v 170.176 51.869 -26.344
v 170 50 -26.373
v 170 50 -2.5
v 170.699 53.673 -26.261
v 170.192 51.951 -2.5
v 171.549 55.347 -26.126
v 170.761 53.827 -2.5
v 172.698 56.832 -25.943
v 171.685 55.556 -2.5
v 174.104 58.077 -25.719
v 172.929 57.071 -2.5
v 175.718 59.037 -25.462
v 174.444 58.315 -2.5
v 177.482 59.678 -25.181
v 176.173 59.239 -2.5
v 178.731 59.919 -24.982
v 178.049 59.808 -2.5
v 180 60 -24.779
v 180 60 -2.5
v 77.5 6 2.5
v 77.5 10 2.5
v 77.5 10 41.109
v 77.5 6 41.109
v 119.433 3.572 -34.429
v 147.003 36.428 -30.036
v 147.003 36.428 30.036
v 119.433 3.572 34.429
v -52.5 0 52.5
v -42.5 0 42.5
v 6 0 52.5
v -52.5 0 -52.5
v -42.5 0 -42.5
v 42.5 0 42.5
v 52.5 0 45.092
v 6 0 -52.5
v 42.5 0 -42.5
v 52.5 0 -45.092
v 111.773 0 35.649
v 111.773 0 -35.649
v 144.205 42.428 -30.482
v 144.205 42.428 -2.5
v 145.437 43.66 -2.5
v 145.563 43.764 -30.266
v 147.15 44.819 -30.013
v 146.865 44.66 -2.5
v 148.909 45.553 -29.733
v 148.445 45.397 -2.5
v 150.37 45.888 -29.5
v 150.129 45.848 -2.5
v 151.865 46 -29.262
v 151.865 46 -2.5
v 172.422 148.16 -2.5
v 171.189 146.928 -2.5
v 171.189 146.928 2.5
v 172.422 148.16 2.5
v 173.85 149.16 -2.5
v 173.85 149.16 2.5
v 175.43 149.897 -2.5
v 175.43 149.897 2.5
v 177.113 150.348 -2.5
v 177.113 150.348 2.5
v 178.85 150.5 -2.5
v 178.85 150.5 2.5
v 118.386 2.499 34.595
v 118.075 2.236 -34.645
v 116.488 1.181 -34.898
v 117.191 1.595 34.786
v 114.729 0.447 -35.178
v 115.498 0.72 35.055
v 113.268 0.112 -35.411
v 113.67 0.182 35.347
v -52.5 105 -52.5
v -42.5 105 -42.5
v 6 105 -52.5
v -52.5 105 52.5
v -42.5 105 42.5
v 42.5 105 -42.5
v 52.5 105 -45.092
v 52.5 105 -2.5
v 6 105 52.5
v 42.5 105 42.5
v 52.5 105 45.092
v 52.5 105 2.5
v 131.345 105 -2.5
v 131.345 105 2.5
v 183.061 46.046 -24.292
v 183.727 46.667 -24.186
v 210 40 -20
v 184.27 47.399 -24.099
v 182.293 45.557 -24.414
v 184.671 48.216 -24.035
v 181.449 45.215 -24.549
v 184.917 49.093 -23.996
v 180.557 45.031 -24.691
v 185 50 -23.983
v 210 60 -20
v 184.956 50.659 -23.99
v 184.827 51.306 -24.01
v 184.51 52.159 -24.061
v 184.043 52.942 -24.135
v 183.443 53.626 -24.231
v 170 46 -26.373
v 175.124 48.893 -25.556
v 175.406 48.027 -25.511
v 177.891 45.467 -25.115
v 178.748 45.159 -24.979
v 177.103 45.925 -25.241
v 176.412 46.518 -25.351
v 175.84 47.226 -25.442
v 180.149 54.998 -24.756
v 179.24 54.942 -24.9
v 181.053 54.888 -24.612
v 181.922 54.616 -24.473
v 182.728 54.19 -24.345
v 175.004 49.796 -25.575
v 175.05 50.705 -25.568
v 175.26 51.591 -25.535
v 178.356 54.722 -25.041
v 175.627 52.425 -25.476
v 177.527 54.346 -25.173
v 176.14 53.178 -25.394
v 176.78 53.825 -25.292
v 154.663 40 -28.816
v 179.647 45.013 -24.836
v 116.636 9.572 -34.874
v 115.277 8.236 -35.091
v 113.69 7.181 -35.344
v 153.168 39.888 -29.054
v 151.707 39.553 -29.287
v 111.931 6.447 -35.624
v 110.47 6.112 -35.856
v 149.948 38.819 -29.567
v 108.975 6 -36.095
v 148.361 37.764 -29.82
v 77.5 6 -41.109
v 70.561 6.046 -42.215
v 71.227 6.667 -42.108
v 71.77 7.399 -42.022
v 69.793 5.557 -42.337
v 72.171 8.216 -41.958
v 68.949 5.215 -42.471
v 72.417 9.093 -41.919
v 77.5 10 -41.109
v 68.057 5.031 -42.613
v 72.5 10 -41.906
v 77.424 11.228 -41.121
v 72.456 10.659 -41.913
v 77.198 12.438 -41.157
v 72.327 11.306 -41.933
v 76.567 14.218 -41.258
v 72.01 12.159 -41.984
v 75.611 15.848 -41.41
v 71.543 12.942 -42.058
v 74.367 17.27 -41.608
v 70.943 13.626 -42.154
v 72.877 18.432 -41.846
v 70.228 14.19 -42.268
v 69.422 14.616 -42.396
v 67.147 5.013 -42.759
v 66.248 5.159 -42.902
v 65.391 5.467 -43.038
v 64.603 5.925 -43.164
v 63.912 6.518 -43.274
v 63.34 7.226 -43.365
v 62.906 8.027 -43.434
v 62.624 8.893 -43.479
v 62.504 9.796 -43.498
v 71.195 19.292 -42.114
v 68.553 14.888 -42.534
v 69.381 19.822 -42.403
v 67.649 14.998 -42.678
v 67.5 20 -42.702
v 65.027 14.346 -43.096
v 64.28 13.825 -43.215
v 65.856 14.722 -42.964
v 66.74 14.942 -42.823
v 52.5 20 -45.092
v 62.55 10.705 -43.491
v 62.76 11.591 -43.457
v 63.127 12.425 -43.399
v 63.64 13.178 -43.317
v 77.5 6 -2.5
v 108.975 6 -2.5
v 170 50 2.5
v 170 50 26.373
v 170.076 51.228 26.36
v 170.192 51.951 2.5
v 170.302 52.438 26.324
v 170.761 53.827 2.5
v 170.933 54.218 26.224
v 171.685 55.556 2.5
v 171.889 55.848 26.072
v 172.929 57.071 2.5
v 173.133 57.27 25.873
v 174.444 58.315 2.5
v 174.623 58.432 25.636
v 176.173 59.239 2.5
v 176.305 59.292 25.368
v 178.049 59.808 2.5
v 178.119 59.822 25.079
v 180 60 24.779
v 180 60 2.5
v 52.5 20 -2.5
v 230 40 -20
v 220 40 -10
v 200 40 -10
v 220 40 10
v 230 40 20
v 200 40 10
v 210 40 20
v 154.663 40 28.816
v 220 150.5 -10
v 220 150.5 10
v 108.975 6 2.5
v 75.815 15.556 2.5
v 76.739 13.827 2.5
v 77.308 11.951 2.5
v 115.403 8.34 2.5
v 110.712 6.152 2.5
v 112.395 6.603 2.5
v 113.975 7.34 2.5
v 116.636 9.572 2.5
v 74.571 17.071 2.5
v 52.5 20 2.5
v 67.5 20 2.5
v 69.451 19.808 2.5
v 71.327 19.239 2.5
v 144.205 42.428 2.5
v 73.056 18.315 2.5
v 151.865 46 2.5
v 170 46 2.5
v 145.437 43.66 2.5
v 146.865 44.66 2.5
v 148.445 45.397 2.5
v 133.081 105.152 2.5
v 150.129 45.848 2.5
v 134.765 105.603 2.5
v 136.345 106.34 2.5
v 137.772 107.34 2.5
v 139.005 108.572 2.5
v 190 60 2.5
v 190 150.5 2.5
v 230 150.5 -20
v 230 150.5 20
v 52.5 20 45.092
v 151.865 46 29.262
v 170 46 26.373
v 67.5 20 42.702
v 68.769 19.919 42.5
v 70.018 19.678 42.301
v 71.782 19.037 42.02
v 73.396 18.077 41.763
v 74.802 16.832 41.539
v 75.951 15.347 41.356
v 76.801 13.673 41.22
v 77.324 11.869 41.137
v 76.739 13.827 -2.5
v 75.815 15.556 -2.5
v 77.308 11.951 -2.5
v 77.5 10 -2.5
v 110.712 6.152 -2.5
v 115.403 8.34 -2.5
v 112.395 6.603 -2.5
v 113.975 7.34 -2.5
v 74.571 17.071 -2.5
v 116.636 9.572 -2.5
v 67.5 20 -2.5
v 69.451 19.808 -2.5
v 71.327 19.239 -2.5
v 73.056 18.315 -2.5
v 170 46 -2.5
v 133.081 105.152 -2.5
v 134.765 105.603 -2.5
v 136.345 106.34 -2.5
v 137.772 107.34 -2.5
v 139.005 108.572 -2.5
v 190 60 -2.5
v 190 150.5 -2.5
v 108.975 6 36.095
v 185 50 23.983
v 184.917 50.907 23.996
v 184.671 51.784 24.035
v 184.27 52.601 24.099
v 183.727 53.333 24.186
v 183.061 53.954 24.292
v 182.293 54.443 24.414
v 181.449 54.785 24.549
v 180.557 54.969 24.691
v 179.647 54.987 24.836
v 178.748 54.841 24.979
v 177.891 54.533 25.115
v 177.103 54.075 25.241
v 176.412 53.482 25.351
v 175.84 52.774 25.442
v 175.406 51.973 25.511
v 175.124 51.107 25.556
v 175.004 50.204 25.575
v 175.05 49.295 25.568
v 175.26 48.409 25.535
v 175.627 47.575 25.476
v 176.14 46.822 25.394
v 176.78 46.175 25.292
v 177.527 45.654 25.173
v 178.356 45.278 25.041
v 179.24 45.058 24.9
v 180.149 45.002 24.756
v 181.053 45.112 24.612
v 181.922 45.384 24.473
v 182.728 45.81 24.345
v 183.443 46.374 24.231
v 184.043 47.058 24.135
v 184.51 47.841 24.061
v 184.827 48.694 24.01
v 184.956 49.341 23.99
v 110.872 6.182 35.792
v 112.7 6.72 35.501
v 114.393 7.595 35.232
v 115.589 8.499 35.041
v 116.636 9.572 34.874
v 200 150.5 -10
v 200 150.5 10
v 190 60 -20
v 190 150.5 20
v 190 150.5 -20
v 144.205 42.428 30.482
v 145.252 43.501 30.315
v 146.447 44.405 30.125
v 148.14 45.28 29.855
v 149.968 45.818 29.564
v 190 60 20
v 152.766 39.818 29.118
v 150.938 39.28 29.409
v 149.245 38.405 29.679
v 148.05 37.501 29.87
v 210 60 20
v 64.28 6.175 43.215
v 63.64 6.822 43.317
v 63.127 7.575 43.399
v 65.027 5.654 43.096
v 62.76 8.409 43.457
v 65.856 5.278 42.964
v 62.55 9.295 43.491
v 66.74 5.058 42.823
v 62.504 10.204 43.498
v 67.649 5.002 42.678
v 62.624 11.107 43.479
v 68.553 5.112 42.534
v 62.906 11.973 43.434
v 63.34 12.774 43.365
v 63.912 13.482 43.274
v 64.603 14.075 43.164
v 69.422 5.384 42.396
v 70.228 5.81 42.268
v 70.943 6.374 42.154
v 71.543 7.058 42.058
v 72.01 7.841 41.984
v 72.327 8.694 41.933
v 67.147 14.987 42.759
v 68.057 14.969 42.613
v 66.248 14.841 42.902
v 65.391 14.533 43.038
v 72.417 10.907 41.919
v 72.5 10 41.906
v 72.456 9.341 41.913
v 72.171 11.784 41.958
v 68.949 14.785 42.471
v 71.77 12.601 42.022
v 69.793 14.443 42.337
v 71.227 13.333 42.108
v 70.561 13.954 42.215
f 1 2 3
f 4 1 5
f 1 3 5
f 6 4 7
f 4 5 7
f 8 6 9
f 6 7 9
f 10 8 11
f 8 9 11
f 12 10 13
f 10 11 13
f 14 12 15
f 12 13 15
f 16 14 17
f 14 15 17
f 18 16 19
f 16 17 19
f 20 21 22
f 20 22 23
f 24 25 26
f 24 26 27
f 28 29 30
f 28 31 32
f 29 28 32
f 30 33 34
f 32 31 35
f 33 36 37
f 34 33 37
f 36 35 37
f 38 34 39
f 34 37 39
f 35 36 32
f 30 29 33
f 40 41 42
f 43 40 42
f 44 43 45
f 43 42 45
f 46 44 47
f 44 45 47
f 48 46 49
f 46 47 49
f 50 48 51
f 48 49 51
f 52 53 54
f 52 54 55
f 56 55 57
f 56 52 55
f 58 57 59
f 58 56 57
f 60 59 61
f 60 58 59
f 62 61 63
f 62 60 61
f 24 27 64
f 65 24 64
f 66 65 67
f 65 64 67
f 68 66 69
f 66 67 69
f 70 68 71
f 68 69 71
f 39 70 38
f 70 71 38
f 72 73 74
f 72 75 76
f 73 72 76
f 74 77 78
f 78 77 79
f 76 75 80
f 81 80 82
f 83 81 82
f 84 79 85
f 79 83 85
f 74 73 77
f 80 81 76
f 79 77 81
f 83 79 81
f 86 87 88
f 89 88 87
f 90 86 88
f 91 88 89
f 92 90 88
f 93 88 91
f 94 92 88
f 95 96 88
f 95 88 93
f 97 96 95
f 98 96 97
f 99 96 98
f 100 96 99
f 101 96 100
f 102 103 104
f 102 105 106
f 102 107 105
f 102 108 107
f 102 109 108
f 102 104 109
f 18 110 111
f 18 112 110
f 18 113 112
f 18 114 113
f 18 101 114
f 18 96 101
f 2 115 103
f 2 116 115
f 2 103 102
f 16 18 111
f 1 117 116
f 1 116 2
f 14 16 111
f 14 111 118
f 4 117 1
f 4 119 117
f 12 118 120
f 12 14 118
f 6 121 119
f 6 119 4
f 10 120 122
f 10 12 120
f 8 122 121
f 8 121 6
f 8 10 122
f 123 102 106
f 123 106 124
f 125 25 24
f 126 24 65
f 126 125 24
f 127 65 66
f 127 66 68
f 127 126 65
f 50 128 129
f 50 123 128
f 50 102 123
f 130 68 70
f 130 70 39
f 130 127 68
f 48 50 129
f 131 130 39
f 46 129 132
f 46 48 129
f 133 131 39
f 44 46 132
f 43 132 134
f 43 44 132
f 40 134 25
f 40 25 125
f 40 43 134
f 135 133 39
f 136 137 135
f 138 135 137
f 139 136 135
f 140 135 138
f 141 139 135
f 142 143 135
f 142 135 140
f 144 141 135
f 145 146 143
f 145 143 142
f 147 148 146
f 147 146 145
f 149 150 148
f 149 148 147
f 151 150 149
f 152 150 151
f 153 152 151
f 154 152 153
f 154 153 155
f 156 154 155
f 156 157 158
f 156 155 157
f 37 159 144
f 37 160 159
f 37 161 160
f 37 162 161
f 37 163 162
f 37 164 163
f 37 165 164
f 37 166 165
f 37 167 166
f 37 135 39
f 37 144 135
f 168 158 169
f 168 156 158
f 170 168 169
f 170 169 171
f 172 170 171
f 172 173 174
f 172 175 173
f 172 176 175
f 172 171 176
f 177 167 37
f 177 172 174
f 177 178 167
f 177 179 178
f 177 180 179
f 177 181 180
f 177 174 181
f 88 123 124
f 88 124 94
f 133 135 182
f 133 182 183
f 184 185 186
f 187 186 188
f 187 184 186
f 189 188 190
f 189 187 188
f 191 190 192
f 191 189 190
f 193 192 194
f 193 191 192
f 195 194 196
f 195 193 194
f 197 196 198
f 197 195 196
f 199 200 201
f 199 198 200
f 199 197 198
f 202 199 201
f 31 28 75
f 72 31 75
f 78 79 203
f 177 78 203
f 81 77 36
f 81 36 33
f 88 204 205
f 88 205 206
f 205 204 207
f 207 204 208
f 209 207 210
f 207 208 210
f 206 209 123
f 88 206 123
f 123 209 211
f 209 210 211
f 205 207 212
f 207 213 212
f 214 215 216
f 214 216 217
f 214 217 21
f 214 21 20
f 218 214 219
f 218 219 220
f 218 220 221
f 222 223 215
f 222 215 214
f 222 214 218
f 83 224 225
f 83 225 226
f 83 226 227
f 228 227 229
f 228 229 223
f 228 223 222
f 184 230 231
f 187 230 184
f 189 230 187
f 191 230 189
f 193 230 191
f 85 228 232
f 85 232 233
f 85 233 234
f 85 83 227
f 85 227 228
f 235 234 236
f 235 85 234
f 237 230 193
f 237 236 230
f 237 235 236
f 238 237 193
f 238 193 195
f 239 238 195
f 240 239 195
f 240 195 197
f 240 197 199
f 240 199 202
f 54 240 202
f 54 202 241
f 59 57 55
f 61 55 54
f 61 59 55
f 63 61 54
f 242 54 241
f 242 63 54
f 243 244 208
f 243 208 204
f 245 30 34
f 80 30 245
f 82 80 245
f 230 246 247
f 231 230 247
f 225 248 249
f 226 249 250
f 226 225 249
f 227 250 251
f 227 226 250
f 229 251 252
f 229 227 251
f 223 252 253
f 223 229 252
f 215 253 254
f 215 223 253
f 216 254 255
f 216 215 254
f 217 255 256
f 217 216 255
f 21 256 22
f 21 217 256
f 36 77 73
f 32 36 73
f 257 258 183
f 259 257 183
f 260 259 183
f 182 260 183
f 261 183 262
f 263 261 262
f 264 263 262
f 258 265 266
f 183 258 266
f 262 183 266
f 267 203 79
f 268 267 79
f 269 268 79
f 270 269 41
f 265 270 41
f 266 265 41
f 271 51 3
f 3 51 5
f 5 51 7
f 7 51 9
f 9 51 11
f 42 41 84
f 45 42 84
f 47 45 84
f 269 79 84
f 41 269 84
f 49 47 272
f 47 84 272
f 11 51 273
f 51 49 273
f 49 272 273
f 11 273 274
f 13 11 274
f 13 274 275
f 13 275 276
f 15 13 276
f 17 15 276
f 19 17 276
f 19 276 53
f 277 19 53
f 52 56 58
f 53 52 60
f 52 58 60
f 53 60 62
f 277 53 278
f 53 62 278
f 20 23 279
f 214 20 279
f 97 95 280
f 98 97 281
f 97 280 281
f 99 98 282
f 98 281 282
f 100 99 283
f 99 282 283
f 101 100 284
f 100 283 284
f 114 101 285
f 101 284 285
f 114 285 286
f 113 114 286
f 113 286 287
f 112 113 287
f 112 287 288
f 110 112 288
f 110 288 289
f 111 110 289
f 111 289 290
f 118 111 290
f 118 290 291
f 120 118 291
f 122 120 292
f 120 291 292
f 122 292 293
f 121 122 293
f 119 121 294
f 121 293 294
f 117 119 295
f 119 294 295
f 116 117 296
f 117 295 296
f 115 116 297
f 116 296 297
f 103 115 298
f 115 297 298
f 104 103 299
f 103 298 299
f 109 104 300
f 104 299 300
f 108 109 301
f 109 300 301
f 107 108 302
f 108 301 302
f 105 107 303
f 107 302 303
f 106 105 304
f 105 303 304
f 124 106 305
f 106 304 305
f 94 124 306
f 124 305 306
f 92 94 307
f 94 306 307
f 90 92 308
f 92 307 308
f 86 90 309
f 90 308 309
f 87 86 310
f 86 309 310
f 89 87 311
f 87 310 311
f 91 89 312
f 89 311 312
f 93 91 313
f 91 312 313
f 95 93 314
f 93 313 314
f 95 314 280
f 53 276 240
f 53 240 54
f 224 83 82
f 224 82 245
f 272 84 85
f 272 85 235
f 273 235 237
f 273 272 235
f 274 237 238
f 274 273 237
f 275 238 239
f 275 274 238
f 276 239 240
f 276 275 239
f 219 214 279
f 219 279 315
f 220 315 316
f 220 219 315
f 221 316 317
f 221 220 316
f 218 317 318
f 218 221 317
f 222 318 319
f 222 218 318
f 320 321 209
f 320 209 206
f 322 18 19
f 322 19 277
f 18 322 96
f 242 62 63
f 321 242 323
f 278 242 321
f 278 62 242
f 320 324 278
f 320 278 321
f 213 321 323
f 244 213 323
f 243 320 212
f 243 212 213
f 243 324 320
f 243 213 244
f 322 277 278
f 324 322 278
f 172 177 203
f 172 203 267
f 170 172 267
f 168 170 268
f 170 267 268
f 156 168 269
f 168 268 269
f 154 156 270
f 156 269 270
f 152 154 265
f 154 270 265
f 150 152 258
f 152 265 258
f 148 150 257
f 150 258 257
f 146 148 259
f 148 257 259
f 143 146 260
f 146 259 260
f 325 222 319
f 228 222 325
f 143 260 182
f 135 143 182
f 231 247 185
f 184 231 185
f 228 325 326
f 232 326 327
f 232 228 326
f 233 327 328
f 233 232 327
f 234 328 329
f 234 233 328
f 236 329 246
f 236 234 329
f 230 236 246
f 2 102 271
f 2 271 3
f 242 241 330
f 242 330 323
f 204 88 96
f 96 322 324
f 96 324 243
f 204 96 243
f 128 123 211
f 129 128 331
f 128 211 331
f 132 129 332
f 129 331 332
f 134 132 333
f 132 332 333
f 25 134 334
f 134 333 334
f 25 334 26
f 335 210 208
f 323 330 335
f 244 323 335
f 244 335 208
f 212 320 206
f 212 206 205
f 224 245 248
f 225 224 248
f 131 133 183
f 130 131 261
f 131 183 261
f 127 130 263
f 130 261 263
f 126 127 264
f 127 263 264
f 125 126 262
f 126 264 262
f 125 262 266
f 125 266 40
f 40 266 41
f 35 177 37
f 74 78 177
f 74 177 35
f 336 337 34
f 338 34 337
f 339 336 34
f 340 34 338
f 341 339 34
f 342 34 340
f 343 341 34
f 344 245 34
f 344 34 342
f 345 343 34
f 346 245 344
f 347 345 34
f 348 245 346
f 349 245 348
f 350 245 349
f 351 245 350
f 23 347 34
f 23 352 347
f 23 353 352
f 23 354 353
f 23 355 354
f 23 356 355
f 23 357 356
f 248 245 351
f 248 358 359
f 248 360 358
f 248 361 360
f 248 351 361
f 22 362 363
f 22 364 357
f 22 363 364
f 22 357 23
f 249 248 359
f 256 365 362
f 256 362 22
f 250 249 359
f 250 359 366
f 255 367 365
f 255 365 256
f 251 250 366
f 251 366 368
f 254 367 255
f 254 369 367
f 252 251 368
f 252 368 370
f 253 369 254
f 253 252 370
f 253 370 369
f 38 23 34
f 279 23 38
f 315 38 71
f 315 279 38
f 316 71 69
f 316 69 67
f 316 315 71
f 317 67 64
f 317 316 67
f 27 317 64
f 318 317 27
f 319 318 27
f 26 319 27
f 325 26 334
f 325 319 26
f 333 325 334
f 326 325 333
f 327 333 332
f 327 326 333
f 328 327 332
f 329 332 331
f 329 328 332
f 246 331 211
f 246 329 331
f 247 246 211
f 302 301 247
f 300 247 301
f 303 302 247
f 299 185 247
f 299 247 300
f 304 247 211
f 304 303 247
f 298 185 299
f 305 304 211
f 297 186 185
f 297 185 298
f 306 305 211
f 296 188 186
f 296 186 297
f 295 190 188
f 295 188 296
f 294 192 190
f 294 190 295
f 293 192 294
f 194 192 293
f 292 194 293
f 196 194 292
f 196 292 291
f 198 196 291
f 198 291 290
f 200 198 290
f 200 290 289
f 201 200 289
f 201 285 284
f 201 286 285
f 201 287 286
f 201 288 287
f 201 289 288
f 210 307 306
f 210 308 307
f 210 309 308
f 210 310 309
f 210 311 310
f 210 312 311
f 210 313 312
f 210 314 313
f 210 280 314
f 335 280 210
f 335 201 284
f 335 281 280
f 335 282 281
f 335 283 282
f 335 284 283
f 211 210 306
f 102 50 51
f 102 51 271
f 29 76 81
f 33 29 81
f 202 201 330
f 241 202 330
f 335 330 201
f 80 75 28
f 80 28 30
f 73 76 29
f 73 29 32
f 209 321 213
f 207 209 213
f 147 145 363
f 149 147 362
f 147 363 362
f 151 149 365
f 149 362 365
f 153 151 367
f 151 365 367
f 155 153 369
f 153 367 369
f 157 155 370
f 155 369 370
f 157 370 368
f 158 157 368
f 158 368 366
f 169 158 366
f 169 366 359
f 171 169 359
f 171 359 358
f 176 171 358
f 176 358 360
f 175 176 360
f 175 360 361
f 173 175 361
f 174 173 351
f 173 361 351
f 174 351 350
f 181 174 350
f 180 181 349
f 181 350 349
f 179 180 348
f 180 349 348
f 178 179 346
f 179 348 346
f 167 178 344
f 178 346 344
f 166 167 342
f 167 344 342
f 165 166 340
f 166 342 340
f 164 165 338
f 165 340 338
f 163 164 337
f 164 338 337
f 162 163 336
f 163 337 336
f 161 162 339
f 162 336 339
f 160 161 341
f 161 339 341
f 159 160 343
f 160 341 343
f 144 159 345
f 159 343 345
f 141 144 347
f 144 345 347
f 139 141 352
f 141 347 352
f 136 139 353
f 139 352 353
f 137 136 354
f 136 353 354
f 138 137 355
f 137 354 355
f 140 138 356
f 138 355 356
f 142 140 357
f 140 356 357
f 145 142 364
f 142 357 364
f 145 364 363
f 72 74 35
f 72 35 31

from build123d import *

# Parameters (mm, degrees)
ESQUISSE1_W                  = 52.5
ESQUISSE1_H                  = 105
BOSS_EXTRU_1_DEPTH           = 52.5
ESQUISSE2_W                  = 40
ESQUISSE2_H                  = 40
ESQUISSE2_W_2                = 20
ESQUISSE2_H_2                = 20
BOSS_EXTRU_2_DEPTH           = 45.5
BOSS_EXTRU_2_DEPTH_BACK      = 105
ESQUISSE2_3_W                = 42.5
ESQUISSE2_3_H                = 85
ENL_V_MAT_EXTRU_1_DEPTH      = 106
ENL_V_START                  = -2.5
ENL_V_MAT_EXTRU_3_DEPTH      = 51
ENL_V_START_2                = 2.5
ENL_V_MAT_EXTRU_4_DEPTH      = 51
ESQUISSE1_6_R                = 5
ENL_V_MAT_EXTRU_5_DEPTH      = 53.5
ENL_V_MAT_EXTRU_5_DEPTH_BACK = 53.5
ENL_V_START_3                = -20
ESQUISSE1_7_W                = 20
ESQUISSE1_7_H                = 90.5
ENL_V_MAT_EXTRU_6_DEPTH      = 32.5
ENL_V_START_4                = 20
ESQUISSE1_8_W                = 20
ESQUISSE1_8_H                = 90.5
ENL_V_MAT_EXTRU_7_DEPTH      = 32.5


with BuildPart() as part:
    # Esquisse1 → Boss.-Extru.1 (new body, symmetric)
    with BuildSketch(Plane.XY):
        with Locations((-26.25, 52.5)):
            Rectangle(ESQUISSE1_W, ESQUISSE1_H)
    extrude(amount=BOSS_EXTRU_1_DEPTH, both=True)

    # Esquisse2 → Boss.-Extru.2 (add, two sides)
    with BuildSketch(Plane(origin=(0, 105, 0), x_dir=(1, 0, 0), z_dir=(0, 1, 0))) as boss_extru_2_sk:
        Polygon((210, 20), (52.5, 45.091911765), (52.5, -45.091911765), (210, -20), (190, -20), (190, 20), align=None)
        Polygon((6, 52.5), (0, 52.5), (0, 42.5), (42.5, 42.5), (42.5, -42.5), (0, -42.5), (0, -52.5), (6, -52.5), (52.5, -45.091911765), (52.5, 45.091911765), align=None)
        with Locations((210, 0)):
            Rectangle(ESQUISSE2_W, ESQUISSE2_H)
        with Locations((210, 0)):
            Rectangle(ESQUISSE2_W_2, ESQUISSE2_H_2, mode=Mode.SUBTRACT)
    extrude(amount=BOSS_EXTRU_2_DEPTH)
    extrude(boss_extru_2_sk.sketch, amount=-BOSS_EXTRU_2_DEPTH_BACK)

    # Esquisse2_3 → Enl_v. mat.-Extru.1 (cut, through all)
    with BuildSketch(Plane(origin=(0, 105, 0), x_dir=(1, 0, 0), z_dir=(0, 1, 0))):
        with Locations((-21.25, 0)):
            Rectangle(ESQUISSE2_3_W, ESQUISSE2_3_H)
        with Locations((21.25, 0)):
            Rectangle(ESQUISSE2_3_W, ESQUISSE2_3_H)
    extrude(amount=-ENL_V_MAT_EXTRU_1_DEPTH, mode=Mode.SUBTRACT)

    # Esquisse1_4 → Enl_v. mat.-Extru.3 (cut, through all)
    with BuildSketch(Plane.XY.offset(ENL_V_START)):
        with BuildLine():
            Line((52.5, 105), (52.5, 20))
            Line((52.5, 20), (67.5, 20))
            ThreePointArc((67.5, 20), (74.571067812, 17.071067812), (77.5, 10))
            Line((77.5, 10), (77.5, 6))
            Line((77.5, 6), (108.975092222, 6))
            ThreePointArc((108.975092222, 6), (113.20127484, 6.93692213), (116.635536654, 9.572123903))
            Line((116.635536654, 9.572123903), (144.204786201, 42.427876097))
            ThreePointArc((144.204786201, 42.427876097), (147.639048015, 45.06307787), (151.865230633, 46))
            Line((151.865230633, 46), (170, 46))
            Line((170, 46), (170, 50))
            ThreePointArc((170, 50), (172.928932188, 57.071067812), (180, 60))
            Line((180, 60), (190, 60))
            Line((190, 60), (190, 150.5))
            Line((190, 150.5), (178.849703137, 150.5))
            ThreePointArc((178.849703137, 150.5), (174.623520519, 149.56307787), (171.189258706, 146.927876097))
            Line((171.189258706, 146.927876097), (139.004961186, 108.572123903))
            ThreePointArc((139.004961186, 108.572123903), (135.570699372, 105.93692213), (131.344516755, 105))
            Line((131.344516755, 105), (52.5, 105))
        make_face()
    extrude(amount=-ENL_V_MAT_EXTRU_3_DEPTH, mode=Mode.SUBTRACT)

    # Esquisse1_5 → Enl_v. mat.-Extru.4 (cut, through all)
    with BuildSketch(Plane.XY.offset(ENL_V_START_2)):
        with BuildLine():
            Line((52.5, 105), (52.5, 20))
            Line((52.5, 20), (67.5, 20))
            ThreePointArc((67.5, 20), (74.571067812, 17.071067812), (77.5, 10))
            Line((77.5, 10), (77.5, 6))
            Line((77.5, 6), (108.975092222, 6))
            ThreePointArc((108.975092222, 6), (113.20127484, 6.93692213), (116.635536654, 9.572123903))
            Line((116.635536654, 9.572123903), (144.204786201, 42.427876097))
            ThreePointArc((144.204786201, 42.427876097), (147.639048015, 45.06307787), (151.865230633, 46))
            Line((151.865230633, 46), (170, 46))
            Line((170, 46), (170, 50))
            ThreePointArc((170, 50), (172.928932188, 57.071067812), (180, 60))
            Line((180, 60), (190, 60))
            Line((190, 60), (190, 150.5))
            Line((190, 150.5), (178.849703137, 150.5))
            ThreePointArc((178.849703137, 150.5), (174.623520519, 149.56307787), (171.189258706, 146.927876097))
            Line((171.189258706, 146.927876097), (139.004961186, 108.572123903))
            ThreePointArc((139.004961186, 108.572123903), (135.570699372, 105.93692213), (131.344516755, 105))
            Line((131.344516755, 105), (52.5, 105))
        make_face()
    extrude(amount=ENL_V_MAT_EXTRU_4_DEPTH, mode=Mode.SUBTRACT)

    # Esquisse1_6 → Enl_v. mat.-Extru.5 (cut, two sides)
    with BuildSketch(Plane.XY) as enl_v_mat_extru_5_sk:
        with BuildLine():
            Line((0, 105), (52.5, 105))
            Line((52.5, 105), (131.344516755, 105))
            ThreePointArc((131.344516755, 105), (135.570699372, 105.93692213), (139.004961186, 108.572123903))
            Line((139.004961186, 108.572123903), (171.189258706, 146.927876097))
            ThreePointArc((171.189258706, 146.927876097), (174.623520519, 149.56307787), (178.849703137, 150.5))
            Line((178.849703137, 150.5), (0, 150.5))
            Line((0, 150.5), (0, 105))
        make_face()
        with BuildLine():
            ThreePointArc((119.433382603, 3.572123903), (115.999120789, 0.93692213), (111.772938171, 0))
            Line((111.772938171, 0), (230, 0))
            Line((230, 0), (230, 40))
            Line((230, 40), (210, 40))
            Line((210, 40), (154.663076582, 40))
            ThreePointArc((154.663076582, 40), (150.436893964, 39.06307787), (147.00263215, 36.427876097))
            Line((147.00263215, 36.427876097), (119.433382603, 3.572123903))
        make_face()
        with Locations((67.5, 10)):
            Circle(ESQUISSE1_6_R)
        with Locations((180, 50)):
            Circle(ESQUISSE1_6_R)
    extrude(amount=ENL_V_MAT_EXTRU_5_DEPTH, mode=Mode.SUBTRACT)
    extrude(enl_v_mat_extru_5_sk.sketch, amount=-ENL_V_MAT_EXTRU_5_DEPTH_BACK, mode=Mode.SUBTRACT)

    # Esquisse1_7 → Enl_v. mat.-Extru.6 (cut)
    with BuildSketch(Plane.XY.offset(ENL_V_START_3)):
        with Locations((200, 105.25)):
            Rectangle(ESQUISSE1_7_W, ESQUISSE1_7_H)
    extrude(amount=-ENL_V_MAT_EXTRU_6_DEPTH, mode=Mode.SUBTRACT)

    # Esquisse1_8 → Enl_v. mat.-Extru.7 (cut)
    with BuildSketch(Plane.XY.offset(ENL_V_START_4)):
        with Locations((200, 105.25)):
            Rectangle(ESQUISSE1_8_W, ESQUISSE1_8_H)
    extrude(amount=ENL_V_MAT_EXTRU_7_DEPTH, mode=Mode.SUBTRACT)


solid = part.part
